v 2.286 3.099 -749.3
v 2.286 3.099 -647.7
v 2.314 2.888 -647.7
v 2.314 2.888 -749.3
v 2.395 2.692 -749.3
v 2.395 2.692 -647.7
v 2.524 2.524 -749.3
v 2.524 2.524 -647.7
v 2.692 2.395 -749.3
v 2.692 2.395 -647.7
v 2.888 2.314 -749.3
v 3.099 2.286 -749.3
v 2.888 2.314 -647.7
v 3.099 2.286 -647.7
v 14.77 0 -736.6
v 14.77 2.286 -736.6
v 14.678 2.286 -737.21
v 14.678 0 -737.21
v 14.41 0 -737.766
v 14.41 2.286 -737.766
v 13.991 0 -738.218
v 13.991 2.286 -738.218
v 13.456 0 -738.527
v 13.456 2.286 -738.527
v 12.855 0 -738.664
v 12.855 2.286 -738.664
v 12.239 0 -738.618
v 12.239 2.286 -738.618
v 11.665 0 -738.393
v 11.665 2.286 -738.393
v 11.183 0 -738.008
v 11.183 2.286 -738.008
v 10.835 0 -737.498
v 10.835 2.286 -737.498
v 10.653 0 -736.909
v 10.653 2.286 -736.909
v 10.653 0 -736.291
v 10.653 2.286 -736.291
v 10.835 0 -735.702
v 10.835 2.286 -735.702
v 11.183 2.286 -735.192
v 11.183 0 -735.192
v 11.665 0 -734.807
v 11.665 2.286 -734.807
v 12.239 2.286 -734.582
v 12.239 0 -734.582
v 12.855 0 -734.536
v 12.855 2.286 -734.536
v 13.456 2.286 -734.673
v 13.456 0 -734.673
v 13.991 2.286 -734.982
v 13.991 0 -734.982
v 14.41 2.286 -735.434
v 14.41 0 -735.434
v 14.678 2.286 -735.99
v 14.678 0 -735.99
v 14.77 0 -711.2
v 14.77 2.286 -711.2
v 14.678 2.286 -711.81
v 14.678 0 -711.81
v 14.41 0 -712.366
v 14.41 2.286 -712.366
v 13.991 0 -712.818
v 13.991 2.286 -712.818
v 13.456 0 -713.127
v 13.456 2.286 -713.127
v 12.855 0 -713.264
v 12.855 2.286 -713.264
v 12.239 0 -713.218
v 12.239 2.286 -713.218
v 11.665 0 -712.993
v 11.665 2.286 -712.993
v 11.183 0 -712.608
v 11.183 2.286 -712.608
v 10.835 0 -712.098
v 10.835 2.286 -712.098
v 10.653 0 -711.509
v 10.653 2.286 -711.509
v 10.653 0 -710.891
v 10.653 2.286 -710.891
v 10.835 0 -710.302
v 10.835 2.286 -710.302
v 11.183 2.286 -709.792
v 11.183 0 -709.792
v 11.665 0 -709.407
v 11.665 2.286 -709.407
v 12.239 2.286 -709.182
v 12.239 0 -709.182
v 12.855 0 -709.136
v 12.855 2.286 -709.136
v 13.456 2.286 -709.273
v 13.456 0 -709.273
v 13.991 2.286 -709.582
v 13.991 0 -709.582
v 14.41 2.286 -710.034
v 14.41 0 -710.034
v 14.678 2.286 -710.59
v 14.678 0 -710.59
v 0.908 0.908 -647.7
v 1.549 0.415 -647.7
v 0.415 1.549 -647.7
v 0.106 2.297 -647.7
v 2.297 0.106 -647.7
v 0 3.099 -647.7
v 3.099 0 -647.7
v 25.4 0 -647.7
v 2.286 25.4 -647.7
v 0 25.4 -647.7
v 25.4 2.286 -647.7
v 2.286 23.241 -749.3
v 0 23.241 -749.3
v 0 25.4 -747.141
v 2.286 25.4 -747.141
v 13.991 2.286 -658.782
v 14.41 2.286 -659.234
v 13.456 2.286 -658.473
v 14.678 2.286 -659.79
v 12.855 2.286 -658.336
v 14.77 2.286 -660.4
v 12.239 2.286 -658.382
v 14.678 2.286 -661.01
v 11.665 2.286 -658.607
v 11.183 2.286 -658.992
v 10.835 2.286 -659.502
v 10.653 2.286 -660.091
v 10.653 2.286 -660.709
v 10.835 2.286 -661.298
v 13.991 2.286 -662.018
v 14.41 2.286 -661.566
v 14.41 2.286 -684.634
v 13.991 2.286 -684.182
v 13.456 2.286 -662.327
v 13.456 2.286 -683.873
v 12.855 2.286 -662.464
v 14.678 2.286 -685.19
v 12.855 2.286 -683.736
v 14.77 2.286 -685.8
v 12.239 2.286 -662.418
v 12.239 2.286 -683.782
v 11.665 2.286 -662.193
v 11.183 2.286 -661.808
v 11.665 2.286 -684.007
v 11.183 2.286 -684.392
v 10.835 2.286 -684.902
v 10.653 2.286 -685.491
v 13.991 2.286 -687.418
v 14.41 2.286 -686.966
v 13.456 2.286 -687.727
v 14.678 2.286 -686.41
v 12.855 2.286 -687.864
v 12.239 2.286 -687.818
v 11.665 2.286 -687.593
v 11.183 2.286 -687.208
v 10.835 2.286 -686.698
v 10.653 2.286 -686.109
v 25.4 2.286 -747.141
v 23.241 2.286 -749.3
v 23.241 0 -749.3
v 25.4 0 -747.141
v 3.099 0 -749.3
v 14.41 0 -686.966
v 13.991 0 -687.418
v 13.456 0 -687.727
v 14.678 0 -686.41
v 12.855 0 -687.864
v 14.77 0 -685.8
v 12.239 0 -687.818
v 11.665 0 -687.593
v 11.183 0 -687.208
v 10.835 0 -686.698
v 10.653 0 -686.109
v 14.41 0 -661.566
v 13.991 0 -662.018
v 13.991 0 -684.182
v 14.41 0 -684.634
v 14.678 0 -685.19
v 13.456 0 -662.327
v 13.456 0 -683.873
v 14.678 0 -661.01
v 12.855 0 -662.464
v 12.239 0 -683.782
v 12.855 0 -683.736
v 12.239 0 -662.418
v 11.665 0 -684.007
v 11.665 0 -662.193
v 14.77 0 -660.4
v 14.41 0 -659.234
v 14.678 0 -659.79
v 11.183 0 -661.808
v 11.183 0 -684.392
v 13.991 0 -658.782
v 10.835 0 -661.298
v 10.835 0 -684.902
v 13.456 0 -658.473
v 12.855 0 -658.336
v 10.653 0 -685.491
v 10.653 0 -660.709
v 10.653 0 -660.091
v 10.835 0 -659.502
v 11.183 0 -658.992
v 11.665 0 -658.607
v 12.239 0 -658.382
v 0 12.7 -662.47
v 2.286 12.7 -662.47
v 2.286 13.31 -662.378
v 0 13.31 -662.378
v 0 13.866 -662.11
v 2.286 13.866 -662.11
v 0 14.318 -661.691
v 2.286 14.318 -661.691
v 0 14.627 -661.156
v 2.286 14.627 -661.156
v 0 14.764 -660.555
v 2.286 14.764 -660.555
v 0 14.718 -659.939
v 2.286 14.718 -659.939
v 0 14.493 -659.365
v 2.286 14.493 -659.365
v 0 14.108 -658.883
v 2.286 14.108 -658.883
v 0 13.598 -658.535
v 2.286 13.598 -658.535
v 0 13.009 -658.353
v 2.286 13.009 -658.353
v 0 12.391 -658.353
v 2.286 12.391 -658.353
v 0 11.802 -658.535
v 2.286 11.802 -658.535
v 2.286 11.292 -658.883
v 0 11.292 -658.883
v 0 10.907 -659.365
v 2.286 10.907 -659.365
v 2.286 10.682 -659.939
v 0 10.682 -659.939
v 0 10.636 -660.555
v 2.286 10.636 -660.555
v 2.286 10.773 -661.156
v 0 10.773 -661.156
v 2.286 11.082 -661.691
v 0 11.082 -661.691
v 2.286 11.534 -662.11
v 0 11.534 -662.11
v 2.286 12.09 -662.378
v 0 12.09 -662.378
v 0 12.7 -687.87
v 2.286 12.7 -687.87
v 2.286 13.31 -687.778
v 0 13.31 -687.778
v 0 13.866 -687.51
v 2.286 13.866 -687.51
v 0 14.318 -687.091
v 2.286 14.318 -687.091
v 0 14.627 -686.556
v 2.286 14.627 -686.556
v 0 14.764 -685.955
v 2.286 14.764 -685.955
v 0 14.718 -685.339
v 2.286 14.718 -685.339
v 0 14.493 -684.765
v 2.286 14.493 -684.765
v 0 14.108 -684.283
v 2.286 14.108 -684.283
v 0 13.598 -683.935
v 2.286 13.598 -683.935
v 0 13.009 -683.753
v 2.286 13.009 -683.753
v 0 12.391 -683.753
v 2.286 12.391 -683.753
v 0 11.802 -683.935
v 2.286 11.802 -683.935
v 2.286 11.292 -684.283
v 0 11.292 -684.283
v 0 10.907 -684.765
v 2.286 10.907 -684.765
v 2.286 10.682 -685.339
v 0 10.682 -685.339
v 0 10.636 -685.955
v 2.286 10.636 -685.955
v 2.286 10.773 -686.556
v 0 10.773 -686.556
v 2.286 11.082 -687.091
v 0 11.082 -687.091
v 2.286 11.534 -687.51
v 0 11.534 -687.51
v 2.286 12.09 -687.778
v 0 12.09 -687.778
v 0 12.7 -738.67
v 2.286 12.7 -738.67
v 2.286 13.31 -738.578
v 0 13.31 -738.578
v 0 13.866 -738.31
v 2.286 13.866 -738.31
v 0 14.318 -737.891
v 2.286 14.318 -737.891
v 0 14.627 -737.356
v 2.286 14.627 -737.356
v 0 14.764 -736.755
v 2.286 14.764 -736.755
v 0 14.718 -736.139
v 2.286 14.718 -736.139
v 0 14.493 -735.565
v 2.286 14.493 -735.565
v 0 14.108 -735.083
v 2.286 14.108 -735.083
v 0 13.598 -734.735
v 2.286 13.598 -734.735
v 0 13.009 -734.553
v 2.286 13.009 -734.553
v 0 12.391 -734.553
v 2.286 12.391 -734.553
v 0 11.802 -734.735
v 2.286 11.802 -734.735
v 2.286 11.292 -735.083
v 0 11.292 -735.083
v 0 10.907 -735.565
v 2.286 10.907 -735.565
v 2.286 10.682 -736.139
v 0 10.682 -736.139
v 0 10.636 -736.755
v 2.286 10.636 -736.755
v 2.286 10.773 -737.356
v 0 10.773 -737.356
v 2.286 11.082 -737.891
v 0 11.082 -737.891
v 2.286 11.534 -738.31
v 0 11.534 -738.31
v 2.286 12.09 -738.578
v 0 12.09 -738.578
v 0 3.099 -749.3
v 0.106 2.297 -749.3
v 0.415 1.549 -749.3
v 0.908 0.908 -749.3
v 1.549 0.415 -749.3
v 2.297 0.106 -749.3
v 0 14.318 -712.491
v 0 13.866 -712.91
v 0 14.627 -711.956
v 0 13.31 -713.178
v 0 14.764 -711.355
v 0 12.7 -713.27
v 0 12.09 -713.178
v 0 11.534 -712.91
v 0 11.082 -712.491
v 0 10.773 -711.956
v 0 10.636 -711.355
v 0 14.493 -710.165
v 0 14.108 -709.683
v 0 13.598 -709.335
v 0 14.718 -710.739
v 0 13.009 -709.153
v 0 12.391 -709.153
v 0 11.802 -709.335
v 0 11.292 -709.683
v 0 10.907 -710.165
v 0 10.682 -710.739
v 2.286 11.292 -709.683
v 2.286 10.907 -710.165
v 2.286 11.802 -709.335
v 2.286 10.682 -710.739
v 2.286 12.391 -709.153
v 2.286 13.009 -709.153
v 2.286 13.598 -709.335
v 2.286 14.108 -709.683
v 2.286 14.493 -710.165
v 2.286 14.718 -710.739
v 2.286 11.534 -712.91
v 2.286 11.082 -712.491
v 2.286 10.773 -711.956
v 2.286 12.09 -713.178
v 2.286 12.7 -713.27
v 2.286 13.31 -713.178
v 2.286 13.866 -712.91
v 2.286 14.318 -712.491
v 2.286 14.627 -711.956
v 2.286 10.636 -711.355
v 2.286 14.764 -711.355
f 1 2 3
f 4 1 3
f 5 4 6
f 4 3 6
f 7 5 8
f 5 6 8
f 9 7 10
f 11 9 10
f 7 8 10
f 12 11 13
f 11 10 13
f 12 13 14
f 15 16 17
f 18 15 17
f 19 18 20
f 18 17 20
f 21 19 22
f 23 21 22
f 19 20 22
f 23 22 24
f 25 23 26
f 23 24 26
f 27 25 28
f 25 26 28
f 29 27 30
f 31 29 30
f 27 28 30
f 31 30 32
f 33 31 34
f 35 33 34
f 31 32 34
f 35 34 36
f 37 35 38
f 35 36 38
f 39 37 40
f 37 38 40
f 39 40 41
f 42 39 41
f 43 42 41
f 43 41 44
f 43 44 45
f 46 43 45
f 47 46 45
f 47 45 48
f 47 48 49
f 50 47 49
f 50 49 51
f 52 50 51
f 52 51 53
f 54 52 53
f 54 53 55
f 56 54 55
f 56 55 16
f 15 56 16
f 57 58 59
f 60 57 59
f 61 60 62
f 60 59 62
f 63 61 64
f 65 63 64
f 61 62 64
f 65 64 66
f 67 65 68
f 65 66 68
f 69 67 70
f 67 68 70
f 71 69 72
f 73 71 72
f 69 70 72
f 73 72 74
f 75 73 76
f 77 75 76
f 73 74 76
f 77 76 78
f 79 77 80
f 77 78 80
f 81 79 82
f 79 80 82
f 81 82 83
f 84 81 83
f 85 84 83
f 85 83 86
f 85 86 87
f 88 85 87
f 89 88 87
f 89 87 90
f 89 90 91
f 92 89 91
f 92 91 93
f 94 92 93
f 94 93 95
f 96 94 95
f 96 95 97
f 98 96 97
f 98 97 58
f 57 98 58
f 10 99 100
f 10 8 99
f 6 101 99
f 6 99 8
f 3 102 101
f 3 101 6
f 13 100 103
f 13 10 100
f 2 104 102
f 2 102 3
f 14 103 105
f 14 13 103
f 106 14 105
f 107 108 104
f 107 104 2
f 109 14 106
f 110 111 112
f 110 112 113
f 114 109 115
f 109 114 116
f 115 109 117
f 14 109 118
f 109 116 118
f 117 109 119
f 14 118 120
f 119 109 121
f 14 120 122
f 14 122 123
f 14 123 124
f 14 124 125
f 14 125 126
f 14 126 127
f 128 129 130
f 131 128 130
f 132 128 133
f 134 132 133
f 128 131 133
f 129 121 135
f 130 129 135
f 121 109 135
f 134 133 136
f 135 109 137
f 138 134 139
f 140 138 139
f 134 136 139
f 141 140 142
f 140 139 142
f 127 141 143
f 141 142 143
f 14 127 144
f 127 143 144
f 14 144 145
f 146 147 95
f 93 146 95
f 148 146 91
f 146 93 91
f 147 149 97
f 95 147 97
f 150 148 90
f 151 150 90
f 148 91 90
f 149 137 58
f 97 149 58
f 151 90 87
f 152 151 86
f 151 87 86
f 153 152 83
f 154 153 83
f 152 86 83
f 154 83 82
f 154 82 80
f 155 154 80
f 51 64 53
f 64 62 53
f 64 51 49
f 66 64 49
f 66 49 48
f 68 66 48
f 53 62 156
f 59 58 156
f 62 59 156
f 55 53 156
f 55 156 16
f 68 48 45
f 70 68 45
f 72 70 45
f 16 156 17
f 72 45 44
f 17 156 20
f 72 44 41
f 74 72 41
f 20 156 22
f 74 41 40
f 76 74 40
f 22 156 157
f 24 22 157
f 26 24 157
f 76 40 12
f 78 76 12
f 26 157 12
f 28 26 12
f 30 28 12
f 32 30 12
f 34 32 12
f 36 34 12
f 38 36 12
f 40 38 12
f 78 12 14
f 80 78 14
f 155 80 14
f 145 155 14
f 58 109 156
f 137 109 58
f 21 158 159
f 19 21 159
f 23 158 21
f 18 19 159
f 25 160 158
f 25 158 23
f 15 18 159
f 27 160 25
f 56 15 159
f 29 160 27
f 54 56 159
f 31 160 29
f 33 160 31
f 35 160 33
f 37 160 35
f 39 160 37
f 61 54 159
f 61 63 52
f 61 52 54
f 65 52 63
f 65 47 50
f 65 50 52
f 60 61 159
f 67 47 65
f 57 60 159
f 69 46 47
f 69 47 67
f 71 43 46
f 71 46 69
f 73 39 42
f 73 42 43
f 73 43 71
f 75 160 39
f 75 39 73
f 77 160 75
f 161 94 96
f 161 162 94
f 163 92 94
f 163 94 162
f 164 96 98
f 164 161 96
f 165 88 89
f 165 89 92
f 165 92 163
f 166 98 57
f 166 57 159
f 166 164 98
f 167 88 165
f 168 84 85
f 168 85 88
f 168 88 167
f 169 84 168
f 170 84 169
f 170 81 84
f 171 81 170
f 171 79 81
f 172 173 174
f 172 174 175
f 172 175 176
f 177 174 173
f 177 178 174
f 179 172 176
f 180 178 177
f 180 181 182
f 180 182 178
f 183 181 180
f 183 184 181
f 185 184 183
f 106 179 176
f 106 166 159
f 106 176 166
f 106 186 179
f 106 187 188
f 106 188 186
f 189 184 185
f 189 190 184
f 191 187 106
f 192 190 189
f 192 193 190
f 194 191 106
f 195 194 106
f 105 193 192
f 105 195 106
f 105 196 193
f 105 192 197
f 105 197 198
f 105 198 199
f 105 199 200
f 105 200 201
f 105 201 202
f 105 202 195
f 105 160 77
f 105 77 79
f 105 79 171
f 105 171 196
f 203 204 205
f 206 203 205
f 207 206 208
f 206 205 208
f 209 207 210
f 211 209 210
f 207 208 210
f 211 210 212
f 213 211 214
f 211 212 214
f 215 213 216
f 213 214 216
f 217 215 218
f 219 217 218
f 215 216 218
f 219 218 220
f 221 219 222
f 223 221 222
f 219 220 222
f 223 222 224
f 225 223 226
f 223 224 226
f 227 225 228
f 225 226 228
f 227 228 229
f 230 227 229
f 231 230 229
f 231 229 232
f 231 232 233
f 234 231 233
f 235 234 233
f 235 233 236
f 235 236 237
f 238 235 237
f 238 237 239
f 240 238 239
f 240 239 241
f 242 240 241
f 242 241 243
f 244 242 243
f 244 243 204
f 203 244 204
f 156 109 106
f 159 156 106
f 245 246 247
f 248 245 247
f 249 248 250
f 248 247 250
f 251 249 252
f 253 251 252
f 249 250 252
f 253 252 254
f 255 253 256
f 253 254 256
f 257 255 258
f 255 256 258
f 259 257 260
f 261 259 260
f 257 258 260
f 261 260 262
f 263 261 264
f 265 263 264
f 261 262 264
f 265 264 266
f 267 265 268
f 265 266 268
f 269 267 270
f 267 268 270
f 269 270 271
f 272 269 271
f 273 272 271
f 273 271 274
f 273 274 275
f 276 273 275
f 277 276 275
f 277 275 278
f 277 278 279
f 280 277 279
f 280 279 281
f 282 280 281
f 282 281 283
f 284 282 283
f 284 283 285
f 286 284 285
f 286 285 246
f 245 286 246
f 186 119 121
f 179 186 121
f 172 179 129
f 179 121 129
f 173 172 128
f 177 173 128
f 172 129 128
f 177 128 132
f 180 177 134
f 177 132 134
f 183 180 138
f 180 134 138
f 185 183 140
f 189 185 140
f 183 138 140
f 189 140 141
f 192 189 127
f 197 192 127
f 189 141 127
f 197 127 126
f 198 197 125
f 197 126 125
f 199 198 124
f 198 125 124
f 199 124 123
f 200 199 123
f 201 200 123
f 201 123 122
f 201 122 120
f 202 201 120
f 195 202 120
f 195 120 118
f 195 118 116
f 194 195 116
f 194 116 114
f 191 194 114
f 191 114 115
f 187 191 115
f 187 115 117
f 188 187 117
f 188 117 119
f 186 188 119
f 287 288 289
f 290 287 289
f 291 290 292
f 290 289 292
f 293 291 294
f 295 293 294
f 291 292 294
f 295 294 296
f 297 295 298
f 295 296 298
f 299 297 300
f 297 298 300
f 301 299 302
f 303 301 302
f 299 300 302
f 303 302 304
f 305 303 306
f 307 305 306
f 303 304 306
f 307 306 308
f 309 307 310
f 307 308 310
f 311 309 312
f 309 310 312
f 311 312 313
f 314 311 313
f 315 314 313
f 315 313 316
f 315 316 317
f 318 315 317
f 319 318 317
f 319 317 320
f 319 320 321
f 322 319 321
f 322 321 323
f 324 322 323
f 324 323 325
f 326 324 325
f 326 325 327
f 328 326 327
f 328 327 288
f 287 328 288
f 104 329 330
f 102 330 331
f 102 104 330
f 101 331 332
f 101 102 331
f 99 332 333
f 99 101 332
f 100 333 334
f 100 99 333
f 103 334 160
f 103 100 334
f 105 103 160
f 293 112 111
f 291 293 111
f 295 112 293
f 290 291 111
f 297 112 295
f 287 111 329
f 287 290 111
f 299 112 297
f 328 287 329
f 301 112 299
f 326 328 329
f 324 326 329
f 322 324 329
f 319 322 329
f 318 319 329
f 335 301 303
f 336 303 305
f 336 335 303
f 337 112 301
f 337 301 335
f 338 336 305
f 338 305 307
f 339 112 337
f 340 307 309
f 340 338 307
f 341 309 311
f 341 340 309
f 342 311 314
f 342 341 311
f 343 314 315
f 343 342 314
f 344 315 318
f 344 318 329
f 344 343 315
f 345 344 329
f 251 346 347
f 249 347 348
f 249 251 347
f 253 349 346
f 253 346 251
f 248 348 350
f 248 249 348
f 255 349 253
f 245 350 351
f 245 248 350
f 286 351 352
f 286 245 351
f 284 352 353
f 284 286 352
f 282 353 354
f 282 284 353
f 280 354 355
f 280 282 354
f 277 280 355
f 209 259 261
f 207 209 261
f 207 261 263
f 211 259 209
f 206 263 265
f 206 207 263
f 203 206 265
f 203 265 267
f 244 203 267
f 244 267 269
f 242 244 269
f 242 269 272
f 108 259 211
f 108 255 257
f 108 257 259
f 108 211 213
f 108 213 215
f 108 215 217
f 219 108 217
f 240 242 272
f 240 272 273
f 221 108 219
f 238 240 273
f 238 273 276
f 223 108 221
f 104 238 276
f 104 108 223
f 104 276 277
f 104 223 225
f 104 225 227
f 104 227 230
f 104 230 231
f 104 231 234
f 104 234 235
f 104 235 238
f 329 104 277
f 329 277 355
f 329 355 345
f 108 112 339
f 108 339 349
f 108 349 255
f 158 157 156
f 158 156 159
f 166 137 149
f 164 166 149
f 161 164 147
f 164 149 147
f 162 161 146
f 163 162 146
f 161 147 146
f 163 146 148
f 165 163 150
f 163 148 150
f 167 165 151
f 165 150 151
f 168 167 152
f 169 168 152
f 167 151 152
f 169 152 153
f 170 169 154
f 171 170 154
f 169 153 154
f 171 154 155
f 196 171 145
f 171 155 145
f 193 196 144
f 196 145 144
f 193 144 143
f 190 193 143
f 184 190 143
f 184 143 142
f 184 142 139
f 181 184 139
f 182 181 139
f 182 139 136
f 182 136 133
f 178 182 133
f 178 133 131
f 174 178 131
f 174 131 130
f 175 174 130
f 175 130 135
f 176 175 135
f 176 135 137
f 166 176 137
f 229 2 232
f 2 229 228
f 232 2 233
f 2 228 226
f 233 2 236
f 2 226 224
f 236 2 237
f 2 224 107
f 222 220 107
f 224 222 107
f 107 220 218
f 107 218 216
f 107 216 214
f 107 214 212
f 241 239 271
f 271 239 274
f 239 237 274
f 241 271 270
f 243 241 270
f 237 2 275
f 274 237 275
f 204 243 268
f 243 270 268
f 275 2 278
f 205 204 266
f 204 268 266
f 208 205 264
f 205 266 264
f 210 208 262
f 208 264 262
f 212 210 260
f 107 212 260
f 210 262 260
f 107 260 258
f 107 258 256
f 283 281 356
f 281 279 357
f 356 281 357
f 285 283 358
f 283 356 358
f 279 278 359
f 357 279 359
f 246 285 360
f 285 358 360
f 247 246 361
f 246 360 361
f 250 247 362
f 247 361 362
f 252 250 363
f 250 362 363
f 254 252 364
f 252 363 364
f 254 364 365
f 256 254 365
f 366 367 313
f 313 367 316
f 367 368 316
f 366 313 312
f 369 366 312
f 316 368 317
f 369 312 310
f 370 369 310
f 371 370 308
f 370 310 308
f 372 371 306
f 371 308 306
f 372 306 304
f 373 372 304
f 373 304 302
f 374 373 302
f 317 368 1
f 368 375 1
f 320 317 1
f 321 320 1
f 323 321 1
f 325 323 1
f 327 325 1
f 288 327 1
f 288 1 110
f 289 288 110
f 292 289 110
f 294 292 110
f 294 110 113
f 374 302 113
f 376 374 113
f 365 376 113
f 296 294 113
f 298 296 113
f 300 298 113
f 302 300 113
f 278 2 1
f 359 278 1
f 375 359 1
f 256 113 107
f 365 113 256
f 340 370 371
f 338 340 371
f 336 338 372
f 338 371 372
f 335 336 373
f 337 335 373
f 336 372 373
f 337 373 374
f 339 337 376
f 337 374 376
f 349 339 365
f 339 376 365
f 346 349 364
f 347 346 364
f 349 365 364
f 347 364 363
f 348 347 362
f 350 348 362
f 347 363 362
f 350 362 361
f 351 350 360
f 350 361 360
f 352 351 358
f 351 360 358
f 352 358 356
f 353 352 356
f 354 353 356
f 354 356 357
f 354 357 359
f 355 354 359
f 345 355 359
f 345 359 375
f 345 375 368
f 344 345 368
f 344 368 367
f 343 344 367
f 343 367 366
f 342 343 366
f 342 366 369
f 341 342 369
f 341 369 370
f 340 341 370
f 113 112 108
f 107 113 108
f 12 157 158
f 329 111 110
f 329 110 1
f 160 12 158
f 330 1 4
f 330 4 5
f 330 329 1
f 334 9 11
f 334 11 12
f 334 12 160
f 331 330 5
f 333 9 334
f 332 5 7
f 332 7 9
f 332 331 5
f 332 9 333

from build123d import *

# Parameters (mm, degrees)
SKETCH1_W                  = 25.4
SKETCH1_H                  = 1498.6
BOSS_EXTRUDE1_DEPTH        = 25.4
SKETCH2_W                  = 23.114
SKETCH2_H                  = 23.114
CUT_EXTRUDE1_DEPTH         = 1499.6
M3_5_CLEARANCE_HOLE1_D     = 4.1402
M3_5_CLEARANCE_HOLE1_DEPTH = 25.4
M3_5_CLEARANCE_HOLE2_D     = 4.1402
M3_5_CLEARANCE_HOLE2_DEPTH = 25.4
CHAMFER1_SIZE              = 2.159
FILLET1_R                  = 0.8128
FILLET2_R                  = 3.0988
SKETCH8_W                  = 95.882963774
SKETCH8_H                  = 79.338329604
CUT_EXTRUDE3_DEPTH         = 1397


with BuildPart() as part:
    # Sketch1 → Boss-Extrude1 (new body)
    with BuildSketch(Plane(origin=(0, 0, 0), x_dir=(0, -1, 0), z_dir=(-1, 0, 0))):
        with Locations((-12.7, 0)):
            Rectangle(SKETCH1_W, SKETCH1_H)
    extrude(amount=-BOSS_EXTRUDE1_DEPTH)

    # Sketch2 → Cut-Extrude1 (cut, through all)
    with BuildSketch(Plane(origin=(0, 0, -749.3), x_dir=(-1, 0, 0), z_dir=(0, 0, -1))):
        with Locations((-13.843, 13.843)):
            Rectangle(SKETCH2_W, SKETCH2_H)
    extrude(amount=-CUT_EXTRUDE1_DEPTH, mode=Mode.SUBTRACT)

    # M3.5 Clearance Hole1
    with Locations(Plane(origin=(0, 0, 0), x_dir=(-1, 0, 0), z_dir=(0, -1, 0))):
        with Locations((-12.7, 736.6), (-12.7, 711.2), (-12.7, 685.8), (-12.7, 660.4), (-12.7, 635), (-12.7, 609.6), (-12.7, 584.2), (-12.7, 558.8), (-12.7, 533.4), (-12.7, 508), (-12.7, 482.6), (-12.7, 457.2), (-12.7, 431.8), (-12.7, 406.4), (-12.7, 381), (-12.7, 355.6), (-12.7, 330.2), (-12.7, 304.8), (-12.7, 279.4), (-12.7, 254), (-12.7, 228.6), (-12.7, 203.2), (-12.7, 177.8), (-12.7, 152.4), (-12.7, 127), (-12.7, 101.6), (-12.7, 76.2), (-12.7, 50.8), (-12.7, 25.4), (-12.7, 0), (-12.7, -25.4), (-12.7, -50.8), (-12.7, -76.2), (-12.7, -101.6), (-12.7, -127), (-12.7, -152.4), (-12.7, -177.8), (-12.7, -203.2), (-12.7, -228.6), (-12.7, -254), (-12.7, -279.4), (-12.7, -304.8), (-12.7, -330.2), (-12.7, -355.6), (-12.7, -381), (-12.7, -406.4), (-12.7, -431.8), (-12.7, -457.2), (-12.7, -482.6), (-12.7, -508), (-12.7, -533.4), (-12.7, -558.8), (-12.7, -584.2), (-12.7, -609.6), (-12.7, -635), (-12.7, -660.4), (-12.7, -685.8), (-12.7, -711.2), (-12.7, -736.6)):
            Hole(M3_5_CLEARANCE_HOLE1_D / 2, depth=M3_5_CLEARANCE_HOLE1_DEPTH)

    # M3.5 Clearance Hole2
    with Locations(Plane.ZY):
        with Locations((711.2, 12.7), (736.6, 12.7), (685.8, 12.7), (660.4, 12.7), (635, 12.7), (609.6, 12.7), (584.2, 12.7), (558.8, 12.7), (533.4, 12.7), (508, 12.7), (482.6, 12.7), (457.2, 12.7), (431.8, 12.7), (406.4, 12.7), (381, 12.7), (355.6, 12.7), (330.2, 12.7), (304.8, 12.7), (279.4, 12.7), (254, 12.7), (228.6, 12.7), (203.2, 12.7), (177.8, 12.7), (152.4, 12.7), (127, 12.7), (101.6, 12.7), (76.2, 12.7), (50.8, 12.7), (25.4, 12.7), (0, 12.7), (-25.4, 12.7), (-50.8, 12.7), (-76.2, 12.7), (-101.6, 12.7), (-127, 12.7), (-152.4, 12.7), (-177.8, 12.7), (-203.2, 12.7), (-228.6, 12.7), (-254, 12.7), (-279.4, 12.7), (-304.8, 12.7), (-330.2, 12.7), (-355.6, 12.7), (-381, 12.7), (-406.4, 12.7), (-431.8, 12.7), (-457.2, 12.7), (-482.6, 12.7), (-508, 12.7), (-533.4, 12.7), (-558.8, 12.7), (-584.2, 12.7), (-609.6, 12.7), (-635, 12.7), (-660.4, 12.7), (-685.8, 12.7), (-711.2, 12.7), (-736.6, 12.7)):
            Hole(M3_5_CLEARANCE_HOLE2_D / 2, depth=M3_5_CLEARANCE_HOLE2_DEPTH)

    # Chamfer1
    chamfer1_edges = [part.edges().sort_by_distance(p)[0] for p in [
        (25.4, 1.143, -749.3),
        (1.143, 25.4, 749.3),
        (1.143, 25.4, -749.3),
        (25.4, 1.143, 749.3),
    ]]
    chamfer(chamfer1_edges, length=CHAMFER1_SIZE)

    # Fillet1
    fillet1_edges = [part.edges().sort_by_distance(p)[0] for p in [
        (2.286, 2.286, 0),
    ]]
    fillet(fillet1_edges, radius=FILLET1_R)

    # Fillet2
    fillet2_edges = [part.edges().sort_by_distance(p)[0] for p in [
        (0, 0, 0),
    ]]
    fillet(fillet2_edges, radius=FILLET2_R)

    # Sketch8 → Cut-Extrude3 (cut)
    with BuildSketch(Plane.XY.offset(749.3)):
        with Locations((2.286, 3.0988)):
            Rectangle(SKETCH8_W, SKETCH8_H)
    extrude(amount=-CUT_EXTRUDE3_DEPTH, mode=Mode.SUBTRACT)


solid = part.part
